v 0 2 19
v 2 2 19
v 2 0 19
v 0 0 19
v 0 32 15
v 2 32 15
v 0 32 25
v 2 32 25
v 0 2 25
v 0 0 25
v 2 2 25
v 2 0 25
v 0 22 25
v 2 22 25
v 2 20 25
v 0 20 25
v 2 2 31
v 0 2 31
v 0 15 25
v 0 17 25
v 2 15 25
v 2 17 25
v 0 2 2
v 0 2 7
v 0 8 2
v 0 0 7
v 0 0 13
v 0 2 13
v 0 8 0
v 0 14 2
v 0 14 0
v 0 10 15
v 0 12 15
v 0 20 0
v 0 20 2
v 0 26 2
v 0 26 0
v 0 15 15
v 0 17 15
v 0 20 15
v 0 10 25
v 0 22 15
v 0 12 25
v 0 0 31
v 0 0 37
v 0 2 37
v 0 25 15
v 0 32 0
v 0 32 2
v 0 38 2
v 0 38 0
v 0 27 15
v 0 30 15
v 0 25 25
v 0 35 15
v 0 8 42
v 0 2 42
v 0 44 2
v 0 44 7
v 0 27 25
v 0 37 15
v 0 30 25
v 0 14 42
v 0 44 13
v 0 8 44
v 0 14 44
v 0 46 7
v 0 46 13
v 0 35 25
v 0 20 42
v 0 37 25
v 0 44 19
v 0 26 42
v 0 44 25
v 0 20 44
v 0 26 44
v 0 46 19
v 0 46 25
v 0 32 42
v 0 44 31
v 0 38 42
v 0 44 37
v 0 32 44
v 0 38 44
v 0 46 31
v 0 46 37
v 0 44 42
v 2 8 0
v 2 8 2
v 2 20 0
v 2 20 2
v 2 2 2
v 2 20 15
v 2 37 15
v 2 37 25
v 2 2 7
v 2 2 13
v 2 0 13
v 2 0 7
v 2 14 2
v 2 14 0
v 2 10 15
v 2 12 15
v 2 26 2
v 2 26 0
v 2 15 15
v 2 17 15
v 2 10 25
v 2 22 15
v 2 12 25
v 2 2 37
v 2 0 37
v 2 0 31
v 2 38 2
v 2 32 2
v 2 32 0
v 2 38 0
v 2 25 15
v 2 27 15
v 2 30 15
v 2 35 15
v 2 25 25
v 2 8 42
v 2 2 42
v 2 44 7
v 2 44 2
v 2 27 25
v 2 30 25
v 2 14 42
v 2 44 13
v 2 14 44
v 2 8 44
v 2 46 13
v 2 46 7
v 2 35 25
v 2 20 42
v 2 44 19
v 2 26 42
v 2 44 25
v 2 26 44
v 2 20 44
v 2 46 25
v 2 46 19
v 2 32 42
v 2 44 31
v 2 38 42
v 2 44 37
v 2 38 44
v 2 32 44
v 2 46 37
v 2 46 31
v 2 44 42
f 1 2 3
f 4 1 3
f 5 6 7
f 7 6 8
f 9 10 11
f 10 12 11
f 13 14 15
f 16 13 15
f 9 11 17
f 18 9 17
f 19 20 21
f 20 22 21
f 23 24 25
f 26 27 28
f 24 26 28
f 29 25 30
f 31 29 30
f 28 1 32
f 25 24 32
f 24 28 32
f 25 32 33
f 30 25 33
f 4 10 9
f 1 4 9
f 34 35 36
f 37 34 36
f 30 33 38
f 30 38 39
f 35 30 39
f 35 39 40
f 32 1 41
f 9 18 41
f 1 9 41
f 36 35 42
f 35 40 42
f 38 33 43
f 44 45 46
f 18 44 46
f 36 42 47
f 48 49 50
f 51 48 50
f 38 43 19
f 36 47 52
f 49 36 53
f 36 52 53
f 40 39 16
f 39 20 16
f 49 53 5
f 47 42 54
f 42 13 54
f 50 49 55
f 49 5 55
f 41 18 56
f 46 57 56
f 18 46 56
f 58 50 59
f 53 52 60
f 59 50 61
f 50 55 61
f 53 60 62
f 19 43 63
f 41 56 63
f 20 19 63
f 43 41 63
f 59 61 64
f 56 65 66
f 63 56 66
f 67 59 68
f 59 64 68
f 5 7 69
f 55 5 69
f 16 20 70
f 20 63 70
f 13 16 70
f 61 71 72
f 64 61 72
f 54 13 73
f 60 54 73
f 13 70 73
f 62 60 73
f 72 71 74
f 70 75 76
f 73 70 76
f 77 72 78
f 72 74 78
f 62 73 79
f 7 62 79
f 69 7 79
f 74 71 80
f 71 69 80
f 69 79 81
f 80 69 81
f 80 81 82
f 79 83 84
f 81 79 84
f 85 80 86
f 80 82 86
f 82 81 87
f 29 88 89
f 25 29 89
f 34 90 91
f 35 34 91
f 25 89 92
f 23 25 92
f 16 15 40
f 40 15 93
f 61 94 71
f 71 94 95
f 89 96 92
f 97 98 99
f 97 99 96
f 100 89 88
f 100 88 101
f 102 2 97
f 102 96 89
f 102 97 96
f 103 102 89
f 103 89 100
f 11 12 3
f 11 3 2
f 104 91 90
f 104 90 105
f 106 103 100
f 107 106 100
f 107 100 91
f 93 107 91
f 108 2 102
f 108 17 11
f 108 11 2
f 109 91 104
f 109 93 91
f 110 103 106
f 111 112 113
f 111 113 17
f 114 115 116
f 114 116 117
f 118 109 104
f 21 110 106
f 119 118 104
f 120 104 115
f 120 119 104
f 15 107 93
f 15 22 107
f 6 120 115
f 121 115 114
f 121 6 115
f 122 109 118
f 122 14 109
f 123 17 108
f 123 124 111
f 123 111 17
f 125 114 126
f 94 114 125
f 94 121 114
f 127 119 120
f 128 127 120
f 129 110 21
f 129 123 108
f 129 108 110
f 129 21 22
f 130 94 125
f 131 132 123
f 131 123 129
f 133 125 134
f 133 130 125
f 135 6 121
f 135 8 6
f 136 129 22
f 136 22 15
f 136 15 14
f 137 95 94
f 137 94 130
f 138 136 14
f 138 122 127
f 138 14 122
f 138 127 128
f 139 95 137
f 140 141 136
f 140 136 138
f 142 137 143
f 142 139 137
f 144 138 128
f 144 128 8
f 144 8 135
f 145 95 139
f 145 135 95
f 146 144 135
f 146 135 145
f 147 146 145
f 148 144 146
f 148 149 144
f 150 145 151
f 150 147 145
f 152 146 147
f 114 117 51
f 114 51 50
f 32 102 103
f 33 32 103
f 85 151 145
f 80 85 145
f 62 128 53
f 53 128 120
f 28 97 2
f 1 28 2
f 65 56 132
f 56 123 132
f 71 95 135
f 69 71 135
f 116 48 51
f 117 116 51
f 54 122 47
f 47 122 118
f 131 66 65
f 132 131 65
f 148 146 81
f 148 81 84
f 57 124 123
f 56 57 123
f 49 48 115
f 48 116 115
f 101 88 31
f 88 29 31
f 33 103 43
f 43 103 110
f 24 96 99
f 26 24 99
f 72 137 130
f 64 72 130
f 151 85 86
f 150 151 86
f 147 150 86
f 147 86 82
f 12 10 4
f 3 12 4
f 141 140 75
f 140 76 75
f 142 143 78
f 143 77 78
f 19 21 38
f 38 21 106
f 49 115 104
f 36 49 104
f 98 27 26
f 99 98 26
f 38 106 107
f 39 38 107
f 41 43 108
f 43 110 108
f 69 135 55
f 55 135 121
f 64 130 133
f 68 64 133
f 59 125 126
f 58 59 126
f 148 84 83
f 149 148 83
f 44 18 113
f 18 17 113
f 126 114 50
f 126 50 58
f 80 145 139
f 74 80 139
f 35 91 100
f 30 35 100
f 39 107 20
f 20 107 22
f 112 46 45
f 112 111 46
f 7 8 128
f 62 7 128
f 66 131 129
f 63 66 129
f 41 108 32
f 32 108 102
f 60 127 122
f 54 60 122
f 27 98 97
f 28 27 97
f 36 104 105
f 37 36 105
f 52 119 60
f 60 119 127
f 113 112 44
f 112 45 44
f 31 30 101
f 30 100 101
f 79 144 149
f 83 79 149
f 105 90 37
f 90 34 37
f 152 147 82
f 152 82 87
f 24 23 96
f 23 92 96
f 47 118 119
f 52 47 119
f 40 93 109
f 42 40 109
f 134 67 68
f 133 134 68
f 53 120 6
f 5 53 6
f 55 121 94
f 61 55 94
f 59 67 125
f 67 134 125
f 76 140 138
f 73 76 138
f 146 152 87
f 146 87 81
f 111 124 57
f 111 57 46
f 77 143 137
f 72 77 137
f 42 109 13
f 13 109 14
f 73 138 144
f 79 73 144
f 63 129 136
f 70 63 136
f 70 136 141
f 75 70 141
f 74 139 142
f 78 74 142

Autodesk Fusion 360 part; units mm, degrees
sketch "スケッチ1" plane through (0, 0, 0) normal (1, 0, 0) x (0, 1, 0)
  line L0 (0, 0) -> (46, 0)
  line L1 (46, 0) -> (46, 44)
  line L2 (46, 44) -> (0, 44)
  line L3 (0, 44) -> (0, 0)
  dimension "d1" = 46
  dimension "d2" = 44
extrude "押し出し1" add sketch "スケッチ1" along normal blind 2
sketch "スケッチ2" plane through (2, 0, 0) normal (1, 0, 0) x (0, 1, 0)
  line L0 (0, 44) -> (0, 0)
  line L1 (0, 0) -> (46, 0)
  line L2 (46, 0) -> (46, 44)
  line L3 (46, 44) -> (0, 44)
  line L4 (0, 0) -> (8, 0)
  line L5 (8, 0) -> (8, 2)
  line L6 (8, 2) -> (0, 2)
  line L7 (0, 2) -> (0, 0)
  line L8 (14, 0) -> (20, 0)
  line L9 (20, 0) -> (20, 2)
  line L10 (20, 2) -> (14, 2)
  line L11 (14, 2) -> (14, 0)
  line L12 (26, 0) -> (32, 0)
  line L13 (32, 0) -> (32, 2)
  line L14 (32, 2) -> (26, 2)
  line L15 (26, 2) -> (26, 0)
  line L16 (46, 0) -> (38, 0)
  line L17 (38, 0) -> (38, 2)
  line L18 (38, 2) -> (46, 2)
  line L19 (46, 2) -> (46, 0)
  line L20 (32, 42) -> (32, 44)
  line L21 (32, 44) -> (26, 44)
  line L22 (20, 42) -> (20, 44)
  line L23 (38, 42) -> (38, 44)
  line L24 (38, 44) -> (46, 44)
  line L25 (46, 44) -> (46, 42)
  line L26 (0, 42) -> (8, 42)
  line L27 (26, 44) -> (26, 42)
  line L28 (8, 42) -> (8, 44)
  line L29 (8, 44) -> (0, 44)
  line L30 (0, 44) -> (0, 42)
  line L31 (20, 44) -> (14, 44)
  line L32 (26, 42) -> (32, 42)
  line L33 (46, 42) -> (38, 42)
  line L34 (14, 42) -> (20, 42)
  line L35 (14, 44) -> (14, 42)
  point P0 (0, 42)
  dimension "d5" = 8
  dimension "d6" = 2
  dimension "d7" = 6
  dimension "d8" = 2
  dimension "d9" = 6
  dimension "d10" = 6
  dimension "d11" = 2
  dimension "d12" = 6
  dimension "d13" = 6
  dimension "d14" = 2
extrude "押し出し2" cut sketch "スケッチ2" against normal blind 2 contours L0 L3 L26 L28 L29 L30 | L0 L1 L4 L5 L6 L7 | L3 L22 L31 L34 L35 | L3 L20 L21 L27 L32 | L1 L8 L9 L10 L11 | L2 L3 L23 L24 L25 L33 | L1 L12 L13 L14 L15 | L1 L2 L16 L17 L18 L19
sketch "スケッチ3" plane through (2, 0, 0) normal (1, 0, 0) x (0, 1, 0)
  line L0 (8, 2) -> (8, 0)
  line L1 (8, 0) -> (14, 0)
  line L2 (14, 0) -> (14, 2)
  line L3 (14, 2) -> (20, 2)
  line L4 (20, 2) -> (20, 0)
  line L5 (20, 0) -> (26, 0)
  line L6 (26, 0) -> (26, 2)
  line L7 (26, 2) -> (32, 2)
  line L8 (32, 2) -> (32, 0)
  line L9 (32, 0) -> (38, 0)
  line L10 (38, 0) -> (38, 2)
  line L11 (38, 2) -> (46, 2)
  line L12 (46, 2) -> (46, 42)
  line L13 (46, 42) -> (38, 42)
  line L14 (38, 42) -> (38, 44)
  line L15 (38, 44) -> (32, 44)
  line L16 (32, 44) -> (32, 42)
  line L17 (32, 42) -> (26, 42)
  line L18 (26, 42) -> (26, 44)
  line L19 (26, 44) -> (20, 44)
  line L20 (20, 44) -> (20, 42)
  line L21 (20, 42) -> (14, 42)
  line L22 (14, 42) -> (14, 44)
  line L23 (14, 44) -> (8, 44)
  line L24 (8, 44) -> (8, 42)
  line L25 (8, 42) -> (0, 42)
  line L26 (0, 42) -> (0, 2)
  line L27 (0, 2) -> (8, 2)
  line L28 (0, 44) -> (2, 44)
  line L29 (2, 44) -> (2, 37)
  line L30 (2, 37) -> (0, 37)
  line L31 (0, 37) -> (0, 44)
  line L32 (2, 31) -> (0, 31)
  line L33 (0, 31) -> (0, 25)
  line L34 (0, 25) -> (2, 25)
  line L35 (2, 25) -> (2, 31)
  line L36 (2, 19) -> (0, 19)
  line L37 (0, 19) -> (0, 13)
  line L38 (0, 13) -> (2, 13)
  line L39 (2, 13) -> (2, 19)
  line L40 (2, 7) -> (0, 7)
  line L41 (0, 7) -> (0, 0)
  line L42 (0, 0) -> (2, 0)
  line L43 (2, 0) -> (2, 7)
  line L44 (46, 31) -> (44, 31)
  line L45 (46, 13) -> (46, 19)
  line L46 (44, 44) -> (46, 44)
  line L47 (44, 0) -> (46, 0)
  line L48 (44, 7) -> (44, 0)
  line L49 (44, 25) -> (46, 25)
  line L50 (46, 37) -> (44, 37)
  line L51 (44, 37) -> (44, 44)
  line L52 (44, 13) -> (46, 13)
  line L53 (44, 31) -> (44, 25)
  line L54 (46, 19) -> (44, 19)
  line L55 (44, 19) -> (44, 13)
  line L56 (46, 25) -> (46, 31)
  line L57 (46, 7) -> (44, 7)
  line L58 (46, 0) -> (46, 7)
  line L59 (46, 44) -> (46, 37)
  point P0 (44, 0)
  dimension "d21" = 2
  dimension "d22" = 7
  dimension "d23" = 2
  dimension "d24" = 6
  dimension "d25" = 6
  dimension "d26" = 6
  dimension "d27" = 6
  dimension "d28" = 2
  dimension "d29" = 6
  dimension "d30" = 7
  dimension "d31" = 2
extrude "押し出し3" cut sketch "スケッチ3" against normal blind 2 contours L27 L41 L42 L43 | L26 L27 L40 L41 L43 | L26 L36 L37 L38 L39 | L26 L32 L33 L34 L35 | L25 L26 L29 L30 L31 | L25 L28 L29 L31 | L11 L12 L48 L57 L58 | L11 L47 L48 L58 | L12 L45 L52 L54 L55 | L12 L44 L49 L53 L56 | L12 L13 L50 L51 L59 | L13 L46 L51 L59
sketch "スケッチ4" plane through (2, 0, 0) normal (1, 0, 0) x (0, 1, 0)
  line L0 (44, 19) -> (46, 19)
  line L1 (46, 19) -> (46, 25)
  line L2 (46, 25) -> (44, 25)
  line L3 (44, 25) -> (44, 31)
  line L4 (44, 31) -> (46, 31)
  line L5 (46, 31) -> (46, 37)
  line L6 (46, 37) -> (44, 37)
  line L7 (44, 37) -> (44, 42)
  line L8 (44, 42) -> (38, 42)
  line L9 (38, 42) -> (38, 44)
  line L10 (38, 44) -> (32, 44)
  line L11 (32, 44) -> (32, 42)
  line L12 (32, 42) -> (26, 42)
  line L13 (26, 42) -> (26, 44)
  line L14 (26, 44) -> (20, 44)
  line L15 (20, 44) -> (20, 42)
  line L16 (20, 42) -> (14, 42)
  line L17 (14, 42) -> (14, 44)
  line L18 (14, 44) -> (8, 44)
  line L19 (8, 44) -> (8, 42)
  line L20 (8, 42) -> (2, 42)
  line L21 (2, 42) -> (2, 37)
  line L22 (2, 37) -> (0, 37)
  line L23 (0, 37) -> (0, 31)
  line L24 (0, 31) -> (2, 31)
  line L25 (2, 31) -> (2, 25)
  line L26 (2, 25) -> (0, 25)
  line L27 (0, 25) -> (0, 19)
  line L28 (0, 19) -> (2, 19)
  line L29 (2, 19) -> (2, 13)
  line L30 (2, 13) -> (0, 13)
  line L31 (0, 13) -> (0, 7)
  line L32 (0, 7) -> (2, 7)
  line L33 (2, 7) -> (2, 2)
  line L34 (2, 2) -> (8, 2)
  line L35 (8, 2) -> (8, 0)
  line L36 (8, 0) -> (14, 0)
  line L37 (14, 0) -> (14, 2)
  line L38 (14, 2) -> (20, 2)
  line L39 (20, 2) -> (20, 0)
  line L40 (20, 0) -> (26, 0)
  line L41 (26, 0) -> (26, 2)
  line L42 (26, 2) -> (32, 2)
  line L43 (32, 2) -> (32, 0)
  line L44 (32, 0) -> (38, 0)
  line L45 (38, 0) -> (38, 2)
  line L46 (38, 2) -> (44, 2)
  line L47 (44, 2) -> (44, 7)
  line L48 (44, 7) -> (46, 7)
  line L49 (46, 7) -> (46, 13)
  line L50 (46, 13) -> (44, 13)
  line L51 (44, 13) -> (44, 19)
  line L52 (10, 15) -> (12, 15)
  line L53 (12, 15) -> (12, 25)
  line L54 (12, 25) -> (10, 25)
  line L55 (10, 25) -> (10, 15)
  line L56 (15, 15) -> (17, 15)
  line L57 (17, 15) -> (17, 25)
  line L58 (17, 25) -> (15, 25)
  line L59 (15, 25) -> (15, 15)
  line L60 (20, 15) -> (22, 15)
  line L61 (22, 15) -> (22, 25)
  line L62 (22, 25) -> (20, 25)
  line L63 (20, 25) -> (20, 15)
  line L64 (25, 15) -> (27, 15)
  line L65 (27, 15) -> (27, 25)
  line L66 (27, 25) -> (25, 25)
  line L67 (25, 25) -> (25, 15)
  line L68 (30, 15) -> (32, 15)
  line L69 (32, 15) -> (32, 25)
  line L70 (32, 25) -> (30, 25)
  line L71 (30, 25) -> (30, 15)
  line L72 (35, 15) -> (37, 15)
  line L73 (37, 15) -> (37, 25)
  line L74 (37, 25) -> (35, 25)
  line L75 (35, 25) -> (35, 15)
extrude "押し出し4" cut sketch "スケッチ4" against normal blind 2 contours L52 L53 L54 L55 | L56 L57 L58 L59 | L60 L61 L62 L63 | L64 L65 L66 L67 | L68 L69 L70 L71 | L72 L73 L74 L75
